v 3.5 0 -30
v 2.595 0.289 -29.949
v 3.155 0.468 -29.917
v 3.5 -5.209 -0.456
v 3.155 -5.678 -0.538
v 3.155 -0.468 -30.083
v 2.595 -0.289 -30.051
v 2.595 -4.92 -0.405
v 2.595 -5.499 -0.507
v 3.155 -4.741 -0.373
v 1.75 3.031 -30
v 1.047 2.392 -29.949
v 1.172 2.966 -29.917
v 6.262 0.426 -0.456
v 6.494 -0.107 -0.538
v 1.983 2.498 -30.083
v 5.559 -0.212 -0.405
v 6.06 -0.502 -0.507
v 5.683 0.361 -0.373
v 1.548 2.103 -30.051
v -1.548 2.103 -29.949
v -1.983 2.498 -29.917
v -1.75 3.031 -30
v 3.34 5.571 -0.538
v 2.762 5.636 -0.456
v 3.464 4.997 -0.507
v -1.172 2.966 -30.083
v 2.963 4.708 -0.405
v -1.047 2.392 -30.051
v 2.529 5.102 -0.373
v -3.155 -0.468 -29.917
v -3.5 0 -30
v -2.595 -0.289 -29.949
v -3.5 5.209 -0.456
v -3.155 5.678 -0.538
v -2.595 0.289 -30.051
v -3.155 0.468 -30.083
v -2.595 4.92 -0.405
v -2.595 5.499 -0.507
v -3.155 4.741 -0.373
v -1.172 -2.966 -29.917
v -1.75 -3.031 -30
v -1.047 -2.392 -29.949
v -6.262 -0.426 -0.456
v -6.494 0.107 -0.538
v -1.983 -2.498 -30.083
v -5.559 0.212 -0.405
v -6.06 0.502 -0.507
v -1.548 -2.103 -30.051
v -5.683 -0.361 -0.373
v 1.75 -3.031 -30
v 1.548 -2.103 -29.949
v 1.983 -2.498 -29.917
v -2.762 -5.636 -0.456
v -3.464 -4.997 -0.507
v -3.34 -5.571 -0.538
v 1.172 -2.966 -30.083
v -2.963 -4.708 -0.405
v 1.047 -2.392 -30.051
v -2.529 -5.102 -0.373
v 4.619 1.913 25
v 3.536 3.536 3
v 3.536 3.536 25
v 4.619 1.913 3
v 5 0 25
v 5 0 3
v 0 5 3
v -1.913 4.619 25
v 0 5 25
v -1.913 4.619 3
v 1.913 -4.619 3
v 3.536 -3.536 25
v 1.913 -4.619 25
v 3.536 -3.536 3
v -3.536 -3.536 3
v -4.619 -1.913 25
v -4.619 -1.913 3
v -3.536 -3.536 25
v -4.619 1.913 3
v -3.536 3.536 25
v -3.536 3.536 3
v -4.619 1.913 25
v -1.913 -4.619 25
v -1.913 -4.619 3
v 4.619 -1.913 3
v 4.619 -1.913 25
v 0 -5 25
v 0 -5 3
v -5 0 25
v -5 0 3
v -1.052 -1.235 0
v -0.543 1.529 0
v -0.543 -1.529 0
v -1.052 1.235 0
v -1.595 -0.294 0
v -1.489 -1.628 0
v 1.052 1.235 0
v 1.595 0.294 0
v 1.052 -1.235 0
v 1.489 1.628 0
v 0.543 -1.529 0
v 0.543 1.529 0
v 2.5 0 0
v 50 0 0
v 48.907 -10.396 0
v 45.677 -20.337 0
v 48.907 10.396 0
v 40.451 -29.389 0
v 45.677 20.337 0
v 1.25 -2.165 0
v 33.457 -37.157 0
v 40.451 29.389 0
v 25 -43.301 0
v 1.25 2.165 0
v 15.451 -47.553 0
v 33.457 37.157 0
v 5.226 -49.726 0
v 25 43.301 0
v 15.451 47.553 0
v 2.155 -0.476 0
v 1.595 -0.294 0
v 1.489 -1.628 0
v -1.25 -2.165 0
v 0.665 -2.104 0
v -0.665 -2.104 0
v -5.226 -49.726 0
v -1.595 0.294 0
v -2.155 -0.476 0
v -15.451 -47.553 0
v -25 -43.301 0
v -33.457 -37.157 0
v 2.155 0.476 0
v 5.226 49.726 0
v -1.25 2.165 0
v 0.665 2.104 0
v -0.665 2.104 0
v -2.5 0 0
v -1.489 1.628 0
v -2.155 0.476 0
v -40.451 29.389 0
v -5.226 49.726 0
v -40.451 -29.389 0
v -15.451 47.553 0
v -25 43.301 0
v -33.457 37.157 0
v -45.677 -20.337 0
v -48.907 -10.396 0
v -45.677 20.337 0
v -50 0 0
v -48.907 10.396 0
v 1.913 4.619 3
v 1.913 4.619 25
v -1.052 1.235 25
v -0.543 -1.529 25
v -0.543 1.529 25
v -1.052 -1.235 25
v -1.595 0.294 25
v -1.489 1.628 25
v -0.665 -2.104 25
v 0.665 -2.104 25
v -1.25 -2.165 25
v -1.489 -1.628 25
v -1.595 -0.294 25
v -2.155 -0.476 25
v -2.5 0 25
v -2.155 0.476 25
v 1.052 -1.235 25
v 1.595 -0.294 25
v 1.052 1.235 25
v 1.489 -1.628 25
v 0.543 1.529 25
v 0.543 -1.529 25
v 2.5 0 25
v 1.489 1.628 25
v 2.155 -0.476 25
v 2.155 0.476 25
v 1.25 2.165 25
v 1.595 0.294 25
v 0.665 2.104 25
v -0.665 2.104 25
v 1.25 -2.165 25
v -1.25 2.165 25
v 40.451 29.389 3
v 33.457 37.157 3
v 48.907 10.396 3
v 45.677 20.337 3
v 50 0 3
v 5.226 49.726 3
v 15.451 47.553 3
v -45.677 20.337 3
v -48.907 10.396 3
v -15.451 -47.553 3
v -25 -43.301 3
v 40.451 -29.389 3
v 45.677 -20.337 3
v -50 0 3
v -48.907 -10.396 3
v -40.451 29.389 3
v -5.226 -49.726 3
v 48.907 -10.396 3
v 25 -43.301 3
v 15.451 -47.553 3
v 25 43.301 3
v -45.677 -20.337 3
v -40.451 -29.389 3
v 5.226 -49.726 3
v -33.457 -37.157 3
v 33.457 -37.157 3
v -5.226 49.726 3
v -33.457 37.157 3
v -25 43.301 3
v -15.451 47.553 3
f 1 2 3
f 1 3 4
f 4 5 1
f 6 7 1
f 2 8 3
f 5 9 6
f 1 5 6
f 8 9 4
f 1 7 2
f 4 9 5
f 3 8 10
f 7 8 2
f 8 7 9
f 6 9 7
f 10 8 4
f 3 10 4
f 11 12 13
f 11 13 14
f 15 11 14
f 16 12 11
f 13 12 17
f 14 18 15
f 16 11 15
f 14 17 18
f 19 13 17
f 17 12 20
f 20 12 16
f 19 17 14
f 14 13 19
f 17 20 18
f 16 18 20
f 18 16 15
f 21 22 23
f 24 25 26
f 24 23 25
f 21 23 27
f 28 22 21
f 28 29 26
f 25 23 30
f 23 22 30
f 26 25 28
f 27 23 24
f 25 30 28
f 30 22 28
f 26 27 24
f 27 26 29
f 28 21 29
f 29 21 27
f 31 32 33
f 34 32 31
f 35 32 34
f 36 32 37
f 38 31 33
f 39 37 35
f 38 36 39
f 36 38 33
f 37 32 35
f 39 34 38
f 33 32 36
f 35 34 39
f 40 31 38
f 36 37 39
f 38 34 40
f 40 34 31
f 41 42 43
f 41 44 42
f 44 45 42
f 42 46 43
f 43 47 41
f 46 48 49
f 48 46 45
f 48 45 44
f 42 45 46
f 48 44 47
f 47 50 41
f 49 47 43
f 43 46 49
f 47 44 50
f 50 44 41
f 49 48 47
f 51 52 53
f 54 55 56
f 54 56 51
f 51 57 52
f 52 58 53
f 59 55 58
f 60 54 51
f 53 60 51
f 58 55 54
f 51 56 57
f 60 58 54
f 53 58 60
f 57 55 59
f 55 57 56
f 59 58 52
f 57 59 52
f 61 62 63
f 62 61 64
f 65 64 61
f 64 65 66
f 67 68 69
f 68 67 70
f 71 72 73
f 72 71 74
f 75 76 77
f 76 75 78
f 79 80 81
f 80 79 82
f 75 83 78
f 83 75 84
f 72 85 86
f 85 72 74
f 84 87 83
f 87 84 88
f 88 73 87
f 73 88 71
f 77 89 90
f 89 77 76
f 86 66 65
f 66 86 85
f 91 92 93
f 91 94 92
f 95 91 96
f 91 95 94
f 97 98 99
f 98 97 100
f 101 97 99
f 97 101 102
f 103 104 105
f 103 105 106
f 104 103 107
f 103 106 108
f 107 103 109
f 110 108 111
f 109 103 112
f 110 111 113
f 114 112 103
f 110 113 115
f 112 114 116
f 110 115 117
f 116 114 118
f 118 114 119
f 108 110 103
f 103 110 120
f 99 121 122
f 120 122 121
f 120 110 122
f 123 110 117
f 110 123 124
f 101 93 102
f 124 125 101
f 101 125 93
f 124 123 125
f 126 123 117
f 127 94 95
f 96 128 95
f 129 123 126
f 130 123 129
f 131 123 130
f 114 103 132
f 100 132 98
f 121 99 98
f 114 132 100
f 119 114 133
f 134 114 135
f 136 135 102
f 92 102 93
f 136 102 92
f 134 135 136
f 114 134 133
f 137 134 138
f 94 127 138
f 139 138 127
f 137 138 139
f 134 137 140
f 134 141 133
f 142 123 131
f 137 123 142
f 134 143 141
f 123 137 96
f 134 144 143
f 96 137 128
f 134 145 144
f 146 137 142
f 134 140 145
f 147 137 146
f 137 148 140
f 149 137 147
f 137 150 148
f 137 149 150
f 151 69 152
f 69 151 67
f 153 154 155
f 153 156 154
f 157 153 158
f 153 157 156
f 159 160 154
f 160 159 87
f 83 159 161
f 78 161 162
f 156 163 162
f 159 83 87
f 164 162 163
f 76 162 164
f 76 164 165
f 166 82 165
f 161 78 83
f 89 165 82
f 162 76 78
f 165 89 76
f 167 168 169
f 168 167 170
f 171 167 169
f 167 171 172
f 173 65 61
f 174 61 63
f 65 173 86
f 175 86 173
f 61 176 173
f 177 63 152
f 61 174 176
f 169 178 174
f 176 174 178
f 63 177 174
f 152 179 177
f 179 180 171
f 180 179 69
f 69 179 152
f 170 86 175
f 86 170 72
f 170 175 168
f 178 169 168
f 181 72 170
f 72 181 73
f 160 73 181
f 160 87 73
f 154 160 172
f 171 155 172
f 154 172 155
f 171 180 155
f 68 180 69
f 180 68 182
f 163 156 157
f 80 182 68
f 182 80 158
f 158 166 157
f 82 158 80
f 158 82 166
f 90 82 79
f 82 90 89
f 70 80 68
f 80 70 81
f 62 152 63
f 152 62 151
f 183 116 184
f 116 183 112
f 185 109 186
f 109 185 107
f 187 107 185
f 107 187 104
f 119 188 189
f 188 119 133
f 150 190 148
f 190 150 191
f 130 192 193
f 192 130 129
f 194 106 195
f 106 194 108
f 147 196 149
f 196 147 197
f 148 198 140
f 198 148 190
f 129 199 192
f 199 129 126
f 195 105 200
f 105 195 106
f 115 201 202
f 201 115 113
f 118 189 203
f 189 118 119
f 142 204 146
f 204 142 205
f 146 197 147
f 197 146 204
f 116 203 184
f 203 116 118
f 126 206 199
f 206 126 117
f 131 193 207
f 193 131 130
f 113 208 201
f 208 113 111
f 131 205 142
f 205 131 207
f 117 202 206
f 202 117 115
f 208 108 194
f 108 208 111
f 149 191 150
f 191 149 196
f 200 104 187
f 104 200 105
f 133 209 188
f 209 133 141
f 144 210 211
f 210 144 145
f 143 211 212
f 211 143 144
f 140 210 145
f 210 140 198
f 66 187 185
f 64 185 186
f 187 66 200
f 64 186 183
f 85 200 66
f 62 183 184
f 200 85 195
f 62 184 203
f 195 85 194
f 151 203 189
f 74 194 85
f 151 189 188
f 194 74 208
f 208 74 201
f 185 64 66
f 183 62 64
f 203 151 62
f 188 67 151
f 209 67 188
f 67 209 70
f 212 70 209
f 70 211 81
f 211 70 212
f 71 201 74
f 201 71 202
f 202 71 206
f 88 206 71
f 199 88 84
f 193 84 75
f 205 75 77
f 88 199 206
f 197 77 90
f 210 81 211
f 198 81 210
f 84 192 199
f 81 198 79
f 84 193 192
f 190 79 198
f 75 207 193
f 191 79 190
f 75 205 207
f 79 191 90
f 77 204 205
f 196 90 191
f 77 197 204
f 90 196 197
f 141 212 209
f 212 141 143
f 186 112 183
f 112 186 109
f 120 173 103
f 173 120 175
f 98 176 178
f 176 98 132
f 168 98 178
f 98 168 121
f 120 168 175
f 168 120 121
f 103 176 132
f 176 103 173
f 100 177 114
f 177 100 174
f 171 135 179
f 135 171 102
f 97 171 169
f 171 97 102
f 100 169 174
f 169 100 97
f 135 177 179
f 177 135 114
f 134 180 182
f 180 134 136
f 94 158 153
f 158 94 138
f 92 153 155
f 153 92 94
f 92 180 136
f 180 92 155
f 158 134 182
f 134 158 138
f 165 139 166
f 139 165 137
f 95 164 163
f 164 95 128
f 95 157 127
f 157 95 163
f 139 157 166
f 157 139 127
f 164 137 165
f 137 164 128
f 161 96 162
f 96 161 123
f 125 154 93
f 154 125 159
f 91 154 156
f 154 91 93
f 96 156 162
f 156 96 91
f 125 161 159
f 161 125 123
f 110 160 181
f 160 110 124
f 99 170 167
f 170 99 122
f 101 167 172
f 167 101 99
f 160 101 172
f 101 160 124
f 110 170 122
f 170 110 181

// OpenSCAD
difference() {
  union() {
    linear_extrude(height=25) {
      circle(r=5);
    }
    linear_extrude(height=3) {
      circle(r=50);
    }
    for(i=[0:6]) {
      rotate(i*60) {
        translate([3,0,-30]) {
          rotate([10, 0, 0]) {
            linear_extrude(height=30) {
              circle(d=1);
            }
          }
        }
      }
    }
  }
  for(i=[0:6]) {
    rotate(i*60) {
      translate([2,0,0]) {
        linear_extrude(height=35) {
          circle(d=1);
        }
      }
    }
  }
}
